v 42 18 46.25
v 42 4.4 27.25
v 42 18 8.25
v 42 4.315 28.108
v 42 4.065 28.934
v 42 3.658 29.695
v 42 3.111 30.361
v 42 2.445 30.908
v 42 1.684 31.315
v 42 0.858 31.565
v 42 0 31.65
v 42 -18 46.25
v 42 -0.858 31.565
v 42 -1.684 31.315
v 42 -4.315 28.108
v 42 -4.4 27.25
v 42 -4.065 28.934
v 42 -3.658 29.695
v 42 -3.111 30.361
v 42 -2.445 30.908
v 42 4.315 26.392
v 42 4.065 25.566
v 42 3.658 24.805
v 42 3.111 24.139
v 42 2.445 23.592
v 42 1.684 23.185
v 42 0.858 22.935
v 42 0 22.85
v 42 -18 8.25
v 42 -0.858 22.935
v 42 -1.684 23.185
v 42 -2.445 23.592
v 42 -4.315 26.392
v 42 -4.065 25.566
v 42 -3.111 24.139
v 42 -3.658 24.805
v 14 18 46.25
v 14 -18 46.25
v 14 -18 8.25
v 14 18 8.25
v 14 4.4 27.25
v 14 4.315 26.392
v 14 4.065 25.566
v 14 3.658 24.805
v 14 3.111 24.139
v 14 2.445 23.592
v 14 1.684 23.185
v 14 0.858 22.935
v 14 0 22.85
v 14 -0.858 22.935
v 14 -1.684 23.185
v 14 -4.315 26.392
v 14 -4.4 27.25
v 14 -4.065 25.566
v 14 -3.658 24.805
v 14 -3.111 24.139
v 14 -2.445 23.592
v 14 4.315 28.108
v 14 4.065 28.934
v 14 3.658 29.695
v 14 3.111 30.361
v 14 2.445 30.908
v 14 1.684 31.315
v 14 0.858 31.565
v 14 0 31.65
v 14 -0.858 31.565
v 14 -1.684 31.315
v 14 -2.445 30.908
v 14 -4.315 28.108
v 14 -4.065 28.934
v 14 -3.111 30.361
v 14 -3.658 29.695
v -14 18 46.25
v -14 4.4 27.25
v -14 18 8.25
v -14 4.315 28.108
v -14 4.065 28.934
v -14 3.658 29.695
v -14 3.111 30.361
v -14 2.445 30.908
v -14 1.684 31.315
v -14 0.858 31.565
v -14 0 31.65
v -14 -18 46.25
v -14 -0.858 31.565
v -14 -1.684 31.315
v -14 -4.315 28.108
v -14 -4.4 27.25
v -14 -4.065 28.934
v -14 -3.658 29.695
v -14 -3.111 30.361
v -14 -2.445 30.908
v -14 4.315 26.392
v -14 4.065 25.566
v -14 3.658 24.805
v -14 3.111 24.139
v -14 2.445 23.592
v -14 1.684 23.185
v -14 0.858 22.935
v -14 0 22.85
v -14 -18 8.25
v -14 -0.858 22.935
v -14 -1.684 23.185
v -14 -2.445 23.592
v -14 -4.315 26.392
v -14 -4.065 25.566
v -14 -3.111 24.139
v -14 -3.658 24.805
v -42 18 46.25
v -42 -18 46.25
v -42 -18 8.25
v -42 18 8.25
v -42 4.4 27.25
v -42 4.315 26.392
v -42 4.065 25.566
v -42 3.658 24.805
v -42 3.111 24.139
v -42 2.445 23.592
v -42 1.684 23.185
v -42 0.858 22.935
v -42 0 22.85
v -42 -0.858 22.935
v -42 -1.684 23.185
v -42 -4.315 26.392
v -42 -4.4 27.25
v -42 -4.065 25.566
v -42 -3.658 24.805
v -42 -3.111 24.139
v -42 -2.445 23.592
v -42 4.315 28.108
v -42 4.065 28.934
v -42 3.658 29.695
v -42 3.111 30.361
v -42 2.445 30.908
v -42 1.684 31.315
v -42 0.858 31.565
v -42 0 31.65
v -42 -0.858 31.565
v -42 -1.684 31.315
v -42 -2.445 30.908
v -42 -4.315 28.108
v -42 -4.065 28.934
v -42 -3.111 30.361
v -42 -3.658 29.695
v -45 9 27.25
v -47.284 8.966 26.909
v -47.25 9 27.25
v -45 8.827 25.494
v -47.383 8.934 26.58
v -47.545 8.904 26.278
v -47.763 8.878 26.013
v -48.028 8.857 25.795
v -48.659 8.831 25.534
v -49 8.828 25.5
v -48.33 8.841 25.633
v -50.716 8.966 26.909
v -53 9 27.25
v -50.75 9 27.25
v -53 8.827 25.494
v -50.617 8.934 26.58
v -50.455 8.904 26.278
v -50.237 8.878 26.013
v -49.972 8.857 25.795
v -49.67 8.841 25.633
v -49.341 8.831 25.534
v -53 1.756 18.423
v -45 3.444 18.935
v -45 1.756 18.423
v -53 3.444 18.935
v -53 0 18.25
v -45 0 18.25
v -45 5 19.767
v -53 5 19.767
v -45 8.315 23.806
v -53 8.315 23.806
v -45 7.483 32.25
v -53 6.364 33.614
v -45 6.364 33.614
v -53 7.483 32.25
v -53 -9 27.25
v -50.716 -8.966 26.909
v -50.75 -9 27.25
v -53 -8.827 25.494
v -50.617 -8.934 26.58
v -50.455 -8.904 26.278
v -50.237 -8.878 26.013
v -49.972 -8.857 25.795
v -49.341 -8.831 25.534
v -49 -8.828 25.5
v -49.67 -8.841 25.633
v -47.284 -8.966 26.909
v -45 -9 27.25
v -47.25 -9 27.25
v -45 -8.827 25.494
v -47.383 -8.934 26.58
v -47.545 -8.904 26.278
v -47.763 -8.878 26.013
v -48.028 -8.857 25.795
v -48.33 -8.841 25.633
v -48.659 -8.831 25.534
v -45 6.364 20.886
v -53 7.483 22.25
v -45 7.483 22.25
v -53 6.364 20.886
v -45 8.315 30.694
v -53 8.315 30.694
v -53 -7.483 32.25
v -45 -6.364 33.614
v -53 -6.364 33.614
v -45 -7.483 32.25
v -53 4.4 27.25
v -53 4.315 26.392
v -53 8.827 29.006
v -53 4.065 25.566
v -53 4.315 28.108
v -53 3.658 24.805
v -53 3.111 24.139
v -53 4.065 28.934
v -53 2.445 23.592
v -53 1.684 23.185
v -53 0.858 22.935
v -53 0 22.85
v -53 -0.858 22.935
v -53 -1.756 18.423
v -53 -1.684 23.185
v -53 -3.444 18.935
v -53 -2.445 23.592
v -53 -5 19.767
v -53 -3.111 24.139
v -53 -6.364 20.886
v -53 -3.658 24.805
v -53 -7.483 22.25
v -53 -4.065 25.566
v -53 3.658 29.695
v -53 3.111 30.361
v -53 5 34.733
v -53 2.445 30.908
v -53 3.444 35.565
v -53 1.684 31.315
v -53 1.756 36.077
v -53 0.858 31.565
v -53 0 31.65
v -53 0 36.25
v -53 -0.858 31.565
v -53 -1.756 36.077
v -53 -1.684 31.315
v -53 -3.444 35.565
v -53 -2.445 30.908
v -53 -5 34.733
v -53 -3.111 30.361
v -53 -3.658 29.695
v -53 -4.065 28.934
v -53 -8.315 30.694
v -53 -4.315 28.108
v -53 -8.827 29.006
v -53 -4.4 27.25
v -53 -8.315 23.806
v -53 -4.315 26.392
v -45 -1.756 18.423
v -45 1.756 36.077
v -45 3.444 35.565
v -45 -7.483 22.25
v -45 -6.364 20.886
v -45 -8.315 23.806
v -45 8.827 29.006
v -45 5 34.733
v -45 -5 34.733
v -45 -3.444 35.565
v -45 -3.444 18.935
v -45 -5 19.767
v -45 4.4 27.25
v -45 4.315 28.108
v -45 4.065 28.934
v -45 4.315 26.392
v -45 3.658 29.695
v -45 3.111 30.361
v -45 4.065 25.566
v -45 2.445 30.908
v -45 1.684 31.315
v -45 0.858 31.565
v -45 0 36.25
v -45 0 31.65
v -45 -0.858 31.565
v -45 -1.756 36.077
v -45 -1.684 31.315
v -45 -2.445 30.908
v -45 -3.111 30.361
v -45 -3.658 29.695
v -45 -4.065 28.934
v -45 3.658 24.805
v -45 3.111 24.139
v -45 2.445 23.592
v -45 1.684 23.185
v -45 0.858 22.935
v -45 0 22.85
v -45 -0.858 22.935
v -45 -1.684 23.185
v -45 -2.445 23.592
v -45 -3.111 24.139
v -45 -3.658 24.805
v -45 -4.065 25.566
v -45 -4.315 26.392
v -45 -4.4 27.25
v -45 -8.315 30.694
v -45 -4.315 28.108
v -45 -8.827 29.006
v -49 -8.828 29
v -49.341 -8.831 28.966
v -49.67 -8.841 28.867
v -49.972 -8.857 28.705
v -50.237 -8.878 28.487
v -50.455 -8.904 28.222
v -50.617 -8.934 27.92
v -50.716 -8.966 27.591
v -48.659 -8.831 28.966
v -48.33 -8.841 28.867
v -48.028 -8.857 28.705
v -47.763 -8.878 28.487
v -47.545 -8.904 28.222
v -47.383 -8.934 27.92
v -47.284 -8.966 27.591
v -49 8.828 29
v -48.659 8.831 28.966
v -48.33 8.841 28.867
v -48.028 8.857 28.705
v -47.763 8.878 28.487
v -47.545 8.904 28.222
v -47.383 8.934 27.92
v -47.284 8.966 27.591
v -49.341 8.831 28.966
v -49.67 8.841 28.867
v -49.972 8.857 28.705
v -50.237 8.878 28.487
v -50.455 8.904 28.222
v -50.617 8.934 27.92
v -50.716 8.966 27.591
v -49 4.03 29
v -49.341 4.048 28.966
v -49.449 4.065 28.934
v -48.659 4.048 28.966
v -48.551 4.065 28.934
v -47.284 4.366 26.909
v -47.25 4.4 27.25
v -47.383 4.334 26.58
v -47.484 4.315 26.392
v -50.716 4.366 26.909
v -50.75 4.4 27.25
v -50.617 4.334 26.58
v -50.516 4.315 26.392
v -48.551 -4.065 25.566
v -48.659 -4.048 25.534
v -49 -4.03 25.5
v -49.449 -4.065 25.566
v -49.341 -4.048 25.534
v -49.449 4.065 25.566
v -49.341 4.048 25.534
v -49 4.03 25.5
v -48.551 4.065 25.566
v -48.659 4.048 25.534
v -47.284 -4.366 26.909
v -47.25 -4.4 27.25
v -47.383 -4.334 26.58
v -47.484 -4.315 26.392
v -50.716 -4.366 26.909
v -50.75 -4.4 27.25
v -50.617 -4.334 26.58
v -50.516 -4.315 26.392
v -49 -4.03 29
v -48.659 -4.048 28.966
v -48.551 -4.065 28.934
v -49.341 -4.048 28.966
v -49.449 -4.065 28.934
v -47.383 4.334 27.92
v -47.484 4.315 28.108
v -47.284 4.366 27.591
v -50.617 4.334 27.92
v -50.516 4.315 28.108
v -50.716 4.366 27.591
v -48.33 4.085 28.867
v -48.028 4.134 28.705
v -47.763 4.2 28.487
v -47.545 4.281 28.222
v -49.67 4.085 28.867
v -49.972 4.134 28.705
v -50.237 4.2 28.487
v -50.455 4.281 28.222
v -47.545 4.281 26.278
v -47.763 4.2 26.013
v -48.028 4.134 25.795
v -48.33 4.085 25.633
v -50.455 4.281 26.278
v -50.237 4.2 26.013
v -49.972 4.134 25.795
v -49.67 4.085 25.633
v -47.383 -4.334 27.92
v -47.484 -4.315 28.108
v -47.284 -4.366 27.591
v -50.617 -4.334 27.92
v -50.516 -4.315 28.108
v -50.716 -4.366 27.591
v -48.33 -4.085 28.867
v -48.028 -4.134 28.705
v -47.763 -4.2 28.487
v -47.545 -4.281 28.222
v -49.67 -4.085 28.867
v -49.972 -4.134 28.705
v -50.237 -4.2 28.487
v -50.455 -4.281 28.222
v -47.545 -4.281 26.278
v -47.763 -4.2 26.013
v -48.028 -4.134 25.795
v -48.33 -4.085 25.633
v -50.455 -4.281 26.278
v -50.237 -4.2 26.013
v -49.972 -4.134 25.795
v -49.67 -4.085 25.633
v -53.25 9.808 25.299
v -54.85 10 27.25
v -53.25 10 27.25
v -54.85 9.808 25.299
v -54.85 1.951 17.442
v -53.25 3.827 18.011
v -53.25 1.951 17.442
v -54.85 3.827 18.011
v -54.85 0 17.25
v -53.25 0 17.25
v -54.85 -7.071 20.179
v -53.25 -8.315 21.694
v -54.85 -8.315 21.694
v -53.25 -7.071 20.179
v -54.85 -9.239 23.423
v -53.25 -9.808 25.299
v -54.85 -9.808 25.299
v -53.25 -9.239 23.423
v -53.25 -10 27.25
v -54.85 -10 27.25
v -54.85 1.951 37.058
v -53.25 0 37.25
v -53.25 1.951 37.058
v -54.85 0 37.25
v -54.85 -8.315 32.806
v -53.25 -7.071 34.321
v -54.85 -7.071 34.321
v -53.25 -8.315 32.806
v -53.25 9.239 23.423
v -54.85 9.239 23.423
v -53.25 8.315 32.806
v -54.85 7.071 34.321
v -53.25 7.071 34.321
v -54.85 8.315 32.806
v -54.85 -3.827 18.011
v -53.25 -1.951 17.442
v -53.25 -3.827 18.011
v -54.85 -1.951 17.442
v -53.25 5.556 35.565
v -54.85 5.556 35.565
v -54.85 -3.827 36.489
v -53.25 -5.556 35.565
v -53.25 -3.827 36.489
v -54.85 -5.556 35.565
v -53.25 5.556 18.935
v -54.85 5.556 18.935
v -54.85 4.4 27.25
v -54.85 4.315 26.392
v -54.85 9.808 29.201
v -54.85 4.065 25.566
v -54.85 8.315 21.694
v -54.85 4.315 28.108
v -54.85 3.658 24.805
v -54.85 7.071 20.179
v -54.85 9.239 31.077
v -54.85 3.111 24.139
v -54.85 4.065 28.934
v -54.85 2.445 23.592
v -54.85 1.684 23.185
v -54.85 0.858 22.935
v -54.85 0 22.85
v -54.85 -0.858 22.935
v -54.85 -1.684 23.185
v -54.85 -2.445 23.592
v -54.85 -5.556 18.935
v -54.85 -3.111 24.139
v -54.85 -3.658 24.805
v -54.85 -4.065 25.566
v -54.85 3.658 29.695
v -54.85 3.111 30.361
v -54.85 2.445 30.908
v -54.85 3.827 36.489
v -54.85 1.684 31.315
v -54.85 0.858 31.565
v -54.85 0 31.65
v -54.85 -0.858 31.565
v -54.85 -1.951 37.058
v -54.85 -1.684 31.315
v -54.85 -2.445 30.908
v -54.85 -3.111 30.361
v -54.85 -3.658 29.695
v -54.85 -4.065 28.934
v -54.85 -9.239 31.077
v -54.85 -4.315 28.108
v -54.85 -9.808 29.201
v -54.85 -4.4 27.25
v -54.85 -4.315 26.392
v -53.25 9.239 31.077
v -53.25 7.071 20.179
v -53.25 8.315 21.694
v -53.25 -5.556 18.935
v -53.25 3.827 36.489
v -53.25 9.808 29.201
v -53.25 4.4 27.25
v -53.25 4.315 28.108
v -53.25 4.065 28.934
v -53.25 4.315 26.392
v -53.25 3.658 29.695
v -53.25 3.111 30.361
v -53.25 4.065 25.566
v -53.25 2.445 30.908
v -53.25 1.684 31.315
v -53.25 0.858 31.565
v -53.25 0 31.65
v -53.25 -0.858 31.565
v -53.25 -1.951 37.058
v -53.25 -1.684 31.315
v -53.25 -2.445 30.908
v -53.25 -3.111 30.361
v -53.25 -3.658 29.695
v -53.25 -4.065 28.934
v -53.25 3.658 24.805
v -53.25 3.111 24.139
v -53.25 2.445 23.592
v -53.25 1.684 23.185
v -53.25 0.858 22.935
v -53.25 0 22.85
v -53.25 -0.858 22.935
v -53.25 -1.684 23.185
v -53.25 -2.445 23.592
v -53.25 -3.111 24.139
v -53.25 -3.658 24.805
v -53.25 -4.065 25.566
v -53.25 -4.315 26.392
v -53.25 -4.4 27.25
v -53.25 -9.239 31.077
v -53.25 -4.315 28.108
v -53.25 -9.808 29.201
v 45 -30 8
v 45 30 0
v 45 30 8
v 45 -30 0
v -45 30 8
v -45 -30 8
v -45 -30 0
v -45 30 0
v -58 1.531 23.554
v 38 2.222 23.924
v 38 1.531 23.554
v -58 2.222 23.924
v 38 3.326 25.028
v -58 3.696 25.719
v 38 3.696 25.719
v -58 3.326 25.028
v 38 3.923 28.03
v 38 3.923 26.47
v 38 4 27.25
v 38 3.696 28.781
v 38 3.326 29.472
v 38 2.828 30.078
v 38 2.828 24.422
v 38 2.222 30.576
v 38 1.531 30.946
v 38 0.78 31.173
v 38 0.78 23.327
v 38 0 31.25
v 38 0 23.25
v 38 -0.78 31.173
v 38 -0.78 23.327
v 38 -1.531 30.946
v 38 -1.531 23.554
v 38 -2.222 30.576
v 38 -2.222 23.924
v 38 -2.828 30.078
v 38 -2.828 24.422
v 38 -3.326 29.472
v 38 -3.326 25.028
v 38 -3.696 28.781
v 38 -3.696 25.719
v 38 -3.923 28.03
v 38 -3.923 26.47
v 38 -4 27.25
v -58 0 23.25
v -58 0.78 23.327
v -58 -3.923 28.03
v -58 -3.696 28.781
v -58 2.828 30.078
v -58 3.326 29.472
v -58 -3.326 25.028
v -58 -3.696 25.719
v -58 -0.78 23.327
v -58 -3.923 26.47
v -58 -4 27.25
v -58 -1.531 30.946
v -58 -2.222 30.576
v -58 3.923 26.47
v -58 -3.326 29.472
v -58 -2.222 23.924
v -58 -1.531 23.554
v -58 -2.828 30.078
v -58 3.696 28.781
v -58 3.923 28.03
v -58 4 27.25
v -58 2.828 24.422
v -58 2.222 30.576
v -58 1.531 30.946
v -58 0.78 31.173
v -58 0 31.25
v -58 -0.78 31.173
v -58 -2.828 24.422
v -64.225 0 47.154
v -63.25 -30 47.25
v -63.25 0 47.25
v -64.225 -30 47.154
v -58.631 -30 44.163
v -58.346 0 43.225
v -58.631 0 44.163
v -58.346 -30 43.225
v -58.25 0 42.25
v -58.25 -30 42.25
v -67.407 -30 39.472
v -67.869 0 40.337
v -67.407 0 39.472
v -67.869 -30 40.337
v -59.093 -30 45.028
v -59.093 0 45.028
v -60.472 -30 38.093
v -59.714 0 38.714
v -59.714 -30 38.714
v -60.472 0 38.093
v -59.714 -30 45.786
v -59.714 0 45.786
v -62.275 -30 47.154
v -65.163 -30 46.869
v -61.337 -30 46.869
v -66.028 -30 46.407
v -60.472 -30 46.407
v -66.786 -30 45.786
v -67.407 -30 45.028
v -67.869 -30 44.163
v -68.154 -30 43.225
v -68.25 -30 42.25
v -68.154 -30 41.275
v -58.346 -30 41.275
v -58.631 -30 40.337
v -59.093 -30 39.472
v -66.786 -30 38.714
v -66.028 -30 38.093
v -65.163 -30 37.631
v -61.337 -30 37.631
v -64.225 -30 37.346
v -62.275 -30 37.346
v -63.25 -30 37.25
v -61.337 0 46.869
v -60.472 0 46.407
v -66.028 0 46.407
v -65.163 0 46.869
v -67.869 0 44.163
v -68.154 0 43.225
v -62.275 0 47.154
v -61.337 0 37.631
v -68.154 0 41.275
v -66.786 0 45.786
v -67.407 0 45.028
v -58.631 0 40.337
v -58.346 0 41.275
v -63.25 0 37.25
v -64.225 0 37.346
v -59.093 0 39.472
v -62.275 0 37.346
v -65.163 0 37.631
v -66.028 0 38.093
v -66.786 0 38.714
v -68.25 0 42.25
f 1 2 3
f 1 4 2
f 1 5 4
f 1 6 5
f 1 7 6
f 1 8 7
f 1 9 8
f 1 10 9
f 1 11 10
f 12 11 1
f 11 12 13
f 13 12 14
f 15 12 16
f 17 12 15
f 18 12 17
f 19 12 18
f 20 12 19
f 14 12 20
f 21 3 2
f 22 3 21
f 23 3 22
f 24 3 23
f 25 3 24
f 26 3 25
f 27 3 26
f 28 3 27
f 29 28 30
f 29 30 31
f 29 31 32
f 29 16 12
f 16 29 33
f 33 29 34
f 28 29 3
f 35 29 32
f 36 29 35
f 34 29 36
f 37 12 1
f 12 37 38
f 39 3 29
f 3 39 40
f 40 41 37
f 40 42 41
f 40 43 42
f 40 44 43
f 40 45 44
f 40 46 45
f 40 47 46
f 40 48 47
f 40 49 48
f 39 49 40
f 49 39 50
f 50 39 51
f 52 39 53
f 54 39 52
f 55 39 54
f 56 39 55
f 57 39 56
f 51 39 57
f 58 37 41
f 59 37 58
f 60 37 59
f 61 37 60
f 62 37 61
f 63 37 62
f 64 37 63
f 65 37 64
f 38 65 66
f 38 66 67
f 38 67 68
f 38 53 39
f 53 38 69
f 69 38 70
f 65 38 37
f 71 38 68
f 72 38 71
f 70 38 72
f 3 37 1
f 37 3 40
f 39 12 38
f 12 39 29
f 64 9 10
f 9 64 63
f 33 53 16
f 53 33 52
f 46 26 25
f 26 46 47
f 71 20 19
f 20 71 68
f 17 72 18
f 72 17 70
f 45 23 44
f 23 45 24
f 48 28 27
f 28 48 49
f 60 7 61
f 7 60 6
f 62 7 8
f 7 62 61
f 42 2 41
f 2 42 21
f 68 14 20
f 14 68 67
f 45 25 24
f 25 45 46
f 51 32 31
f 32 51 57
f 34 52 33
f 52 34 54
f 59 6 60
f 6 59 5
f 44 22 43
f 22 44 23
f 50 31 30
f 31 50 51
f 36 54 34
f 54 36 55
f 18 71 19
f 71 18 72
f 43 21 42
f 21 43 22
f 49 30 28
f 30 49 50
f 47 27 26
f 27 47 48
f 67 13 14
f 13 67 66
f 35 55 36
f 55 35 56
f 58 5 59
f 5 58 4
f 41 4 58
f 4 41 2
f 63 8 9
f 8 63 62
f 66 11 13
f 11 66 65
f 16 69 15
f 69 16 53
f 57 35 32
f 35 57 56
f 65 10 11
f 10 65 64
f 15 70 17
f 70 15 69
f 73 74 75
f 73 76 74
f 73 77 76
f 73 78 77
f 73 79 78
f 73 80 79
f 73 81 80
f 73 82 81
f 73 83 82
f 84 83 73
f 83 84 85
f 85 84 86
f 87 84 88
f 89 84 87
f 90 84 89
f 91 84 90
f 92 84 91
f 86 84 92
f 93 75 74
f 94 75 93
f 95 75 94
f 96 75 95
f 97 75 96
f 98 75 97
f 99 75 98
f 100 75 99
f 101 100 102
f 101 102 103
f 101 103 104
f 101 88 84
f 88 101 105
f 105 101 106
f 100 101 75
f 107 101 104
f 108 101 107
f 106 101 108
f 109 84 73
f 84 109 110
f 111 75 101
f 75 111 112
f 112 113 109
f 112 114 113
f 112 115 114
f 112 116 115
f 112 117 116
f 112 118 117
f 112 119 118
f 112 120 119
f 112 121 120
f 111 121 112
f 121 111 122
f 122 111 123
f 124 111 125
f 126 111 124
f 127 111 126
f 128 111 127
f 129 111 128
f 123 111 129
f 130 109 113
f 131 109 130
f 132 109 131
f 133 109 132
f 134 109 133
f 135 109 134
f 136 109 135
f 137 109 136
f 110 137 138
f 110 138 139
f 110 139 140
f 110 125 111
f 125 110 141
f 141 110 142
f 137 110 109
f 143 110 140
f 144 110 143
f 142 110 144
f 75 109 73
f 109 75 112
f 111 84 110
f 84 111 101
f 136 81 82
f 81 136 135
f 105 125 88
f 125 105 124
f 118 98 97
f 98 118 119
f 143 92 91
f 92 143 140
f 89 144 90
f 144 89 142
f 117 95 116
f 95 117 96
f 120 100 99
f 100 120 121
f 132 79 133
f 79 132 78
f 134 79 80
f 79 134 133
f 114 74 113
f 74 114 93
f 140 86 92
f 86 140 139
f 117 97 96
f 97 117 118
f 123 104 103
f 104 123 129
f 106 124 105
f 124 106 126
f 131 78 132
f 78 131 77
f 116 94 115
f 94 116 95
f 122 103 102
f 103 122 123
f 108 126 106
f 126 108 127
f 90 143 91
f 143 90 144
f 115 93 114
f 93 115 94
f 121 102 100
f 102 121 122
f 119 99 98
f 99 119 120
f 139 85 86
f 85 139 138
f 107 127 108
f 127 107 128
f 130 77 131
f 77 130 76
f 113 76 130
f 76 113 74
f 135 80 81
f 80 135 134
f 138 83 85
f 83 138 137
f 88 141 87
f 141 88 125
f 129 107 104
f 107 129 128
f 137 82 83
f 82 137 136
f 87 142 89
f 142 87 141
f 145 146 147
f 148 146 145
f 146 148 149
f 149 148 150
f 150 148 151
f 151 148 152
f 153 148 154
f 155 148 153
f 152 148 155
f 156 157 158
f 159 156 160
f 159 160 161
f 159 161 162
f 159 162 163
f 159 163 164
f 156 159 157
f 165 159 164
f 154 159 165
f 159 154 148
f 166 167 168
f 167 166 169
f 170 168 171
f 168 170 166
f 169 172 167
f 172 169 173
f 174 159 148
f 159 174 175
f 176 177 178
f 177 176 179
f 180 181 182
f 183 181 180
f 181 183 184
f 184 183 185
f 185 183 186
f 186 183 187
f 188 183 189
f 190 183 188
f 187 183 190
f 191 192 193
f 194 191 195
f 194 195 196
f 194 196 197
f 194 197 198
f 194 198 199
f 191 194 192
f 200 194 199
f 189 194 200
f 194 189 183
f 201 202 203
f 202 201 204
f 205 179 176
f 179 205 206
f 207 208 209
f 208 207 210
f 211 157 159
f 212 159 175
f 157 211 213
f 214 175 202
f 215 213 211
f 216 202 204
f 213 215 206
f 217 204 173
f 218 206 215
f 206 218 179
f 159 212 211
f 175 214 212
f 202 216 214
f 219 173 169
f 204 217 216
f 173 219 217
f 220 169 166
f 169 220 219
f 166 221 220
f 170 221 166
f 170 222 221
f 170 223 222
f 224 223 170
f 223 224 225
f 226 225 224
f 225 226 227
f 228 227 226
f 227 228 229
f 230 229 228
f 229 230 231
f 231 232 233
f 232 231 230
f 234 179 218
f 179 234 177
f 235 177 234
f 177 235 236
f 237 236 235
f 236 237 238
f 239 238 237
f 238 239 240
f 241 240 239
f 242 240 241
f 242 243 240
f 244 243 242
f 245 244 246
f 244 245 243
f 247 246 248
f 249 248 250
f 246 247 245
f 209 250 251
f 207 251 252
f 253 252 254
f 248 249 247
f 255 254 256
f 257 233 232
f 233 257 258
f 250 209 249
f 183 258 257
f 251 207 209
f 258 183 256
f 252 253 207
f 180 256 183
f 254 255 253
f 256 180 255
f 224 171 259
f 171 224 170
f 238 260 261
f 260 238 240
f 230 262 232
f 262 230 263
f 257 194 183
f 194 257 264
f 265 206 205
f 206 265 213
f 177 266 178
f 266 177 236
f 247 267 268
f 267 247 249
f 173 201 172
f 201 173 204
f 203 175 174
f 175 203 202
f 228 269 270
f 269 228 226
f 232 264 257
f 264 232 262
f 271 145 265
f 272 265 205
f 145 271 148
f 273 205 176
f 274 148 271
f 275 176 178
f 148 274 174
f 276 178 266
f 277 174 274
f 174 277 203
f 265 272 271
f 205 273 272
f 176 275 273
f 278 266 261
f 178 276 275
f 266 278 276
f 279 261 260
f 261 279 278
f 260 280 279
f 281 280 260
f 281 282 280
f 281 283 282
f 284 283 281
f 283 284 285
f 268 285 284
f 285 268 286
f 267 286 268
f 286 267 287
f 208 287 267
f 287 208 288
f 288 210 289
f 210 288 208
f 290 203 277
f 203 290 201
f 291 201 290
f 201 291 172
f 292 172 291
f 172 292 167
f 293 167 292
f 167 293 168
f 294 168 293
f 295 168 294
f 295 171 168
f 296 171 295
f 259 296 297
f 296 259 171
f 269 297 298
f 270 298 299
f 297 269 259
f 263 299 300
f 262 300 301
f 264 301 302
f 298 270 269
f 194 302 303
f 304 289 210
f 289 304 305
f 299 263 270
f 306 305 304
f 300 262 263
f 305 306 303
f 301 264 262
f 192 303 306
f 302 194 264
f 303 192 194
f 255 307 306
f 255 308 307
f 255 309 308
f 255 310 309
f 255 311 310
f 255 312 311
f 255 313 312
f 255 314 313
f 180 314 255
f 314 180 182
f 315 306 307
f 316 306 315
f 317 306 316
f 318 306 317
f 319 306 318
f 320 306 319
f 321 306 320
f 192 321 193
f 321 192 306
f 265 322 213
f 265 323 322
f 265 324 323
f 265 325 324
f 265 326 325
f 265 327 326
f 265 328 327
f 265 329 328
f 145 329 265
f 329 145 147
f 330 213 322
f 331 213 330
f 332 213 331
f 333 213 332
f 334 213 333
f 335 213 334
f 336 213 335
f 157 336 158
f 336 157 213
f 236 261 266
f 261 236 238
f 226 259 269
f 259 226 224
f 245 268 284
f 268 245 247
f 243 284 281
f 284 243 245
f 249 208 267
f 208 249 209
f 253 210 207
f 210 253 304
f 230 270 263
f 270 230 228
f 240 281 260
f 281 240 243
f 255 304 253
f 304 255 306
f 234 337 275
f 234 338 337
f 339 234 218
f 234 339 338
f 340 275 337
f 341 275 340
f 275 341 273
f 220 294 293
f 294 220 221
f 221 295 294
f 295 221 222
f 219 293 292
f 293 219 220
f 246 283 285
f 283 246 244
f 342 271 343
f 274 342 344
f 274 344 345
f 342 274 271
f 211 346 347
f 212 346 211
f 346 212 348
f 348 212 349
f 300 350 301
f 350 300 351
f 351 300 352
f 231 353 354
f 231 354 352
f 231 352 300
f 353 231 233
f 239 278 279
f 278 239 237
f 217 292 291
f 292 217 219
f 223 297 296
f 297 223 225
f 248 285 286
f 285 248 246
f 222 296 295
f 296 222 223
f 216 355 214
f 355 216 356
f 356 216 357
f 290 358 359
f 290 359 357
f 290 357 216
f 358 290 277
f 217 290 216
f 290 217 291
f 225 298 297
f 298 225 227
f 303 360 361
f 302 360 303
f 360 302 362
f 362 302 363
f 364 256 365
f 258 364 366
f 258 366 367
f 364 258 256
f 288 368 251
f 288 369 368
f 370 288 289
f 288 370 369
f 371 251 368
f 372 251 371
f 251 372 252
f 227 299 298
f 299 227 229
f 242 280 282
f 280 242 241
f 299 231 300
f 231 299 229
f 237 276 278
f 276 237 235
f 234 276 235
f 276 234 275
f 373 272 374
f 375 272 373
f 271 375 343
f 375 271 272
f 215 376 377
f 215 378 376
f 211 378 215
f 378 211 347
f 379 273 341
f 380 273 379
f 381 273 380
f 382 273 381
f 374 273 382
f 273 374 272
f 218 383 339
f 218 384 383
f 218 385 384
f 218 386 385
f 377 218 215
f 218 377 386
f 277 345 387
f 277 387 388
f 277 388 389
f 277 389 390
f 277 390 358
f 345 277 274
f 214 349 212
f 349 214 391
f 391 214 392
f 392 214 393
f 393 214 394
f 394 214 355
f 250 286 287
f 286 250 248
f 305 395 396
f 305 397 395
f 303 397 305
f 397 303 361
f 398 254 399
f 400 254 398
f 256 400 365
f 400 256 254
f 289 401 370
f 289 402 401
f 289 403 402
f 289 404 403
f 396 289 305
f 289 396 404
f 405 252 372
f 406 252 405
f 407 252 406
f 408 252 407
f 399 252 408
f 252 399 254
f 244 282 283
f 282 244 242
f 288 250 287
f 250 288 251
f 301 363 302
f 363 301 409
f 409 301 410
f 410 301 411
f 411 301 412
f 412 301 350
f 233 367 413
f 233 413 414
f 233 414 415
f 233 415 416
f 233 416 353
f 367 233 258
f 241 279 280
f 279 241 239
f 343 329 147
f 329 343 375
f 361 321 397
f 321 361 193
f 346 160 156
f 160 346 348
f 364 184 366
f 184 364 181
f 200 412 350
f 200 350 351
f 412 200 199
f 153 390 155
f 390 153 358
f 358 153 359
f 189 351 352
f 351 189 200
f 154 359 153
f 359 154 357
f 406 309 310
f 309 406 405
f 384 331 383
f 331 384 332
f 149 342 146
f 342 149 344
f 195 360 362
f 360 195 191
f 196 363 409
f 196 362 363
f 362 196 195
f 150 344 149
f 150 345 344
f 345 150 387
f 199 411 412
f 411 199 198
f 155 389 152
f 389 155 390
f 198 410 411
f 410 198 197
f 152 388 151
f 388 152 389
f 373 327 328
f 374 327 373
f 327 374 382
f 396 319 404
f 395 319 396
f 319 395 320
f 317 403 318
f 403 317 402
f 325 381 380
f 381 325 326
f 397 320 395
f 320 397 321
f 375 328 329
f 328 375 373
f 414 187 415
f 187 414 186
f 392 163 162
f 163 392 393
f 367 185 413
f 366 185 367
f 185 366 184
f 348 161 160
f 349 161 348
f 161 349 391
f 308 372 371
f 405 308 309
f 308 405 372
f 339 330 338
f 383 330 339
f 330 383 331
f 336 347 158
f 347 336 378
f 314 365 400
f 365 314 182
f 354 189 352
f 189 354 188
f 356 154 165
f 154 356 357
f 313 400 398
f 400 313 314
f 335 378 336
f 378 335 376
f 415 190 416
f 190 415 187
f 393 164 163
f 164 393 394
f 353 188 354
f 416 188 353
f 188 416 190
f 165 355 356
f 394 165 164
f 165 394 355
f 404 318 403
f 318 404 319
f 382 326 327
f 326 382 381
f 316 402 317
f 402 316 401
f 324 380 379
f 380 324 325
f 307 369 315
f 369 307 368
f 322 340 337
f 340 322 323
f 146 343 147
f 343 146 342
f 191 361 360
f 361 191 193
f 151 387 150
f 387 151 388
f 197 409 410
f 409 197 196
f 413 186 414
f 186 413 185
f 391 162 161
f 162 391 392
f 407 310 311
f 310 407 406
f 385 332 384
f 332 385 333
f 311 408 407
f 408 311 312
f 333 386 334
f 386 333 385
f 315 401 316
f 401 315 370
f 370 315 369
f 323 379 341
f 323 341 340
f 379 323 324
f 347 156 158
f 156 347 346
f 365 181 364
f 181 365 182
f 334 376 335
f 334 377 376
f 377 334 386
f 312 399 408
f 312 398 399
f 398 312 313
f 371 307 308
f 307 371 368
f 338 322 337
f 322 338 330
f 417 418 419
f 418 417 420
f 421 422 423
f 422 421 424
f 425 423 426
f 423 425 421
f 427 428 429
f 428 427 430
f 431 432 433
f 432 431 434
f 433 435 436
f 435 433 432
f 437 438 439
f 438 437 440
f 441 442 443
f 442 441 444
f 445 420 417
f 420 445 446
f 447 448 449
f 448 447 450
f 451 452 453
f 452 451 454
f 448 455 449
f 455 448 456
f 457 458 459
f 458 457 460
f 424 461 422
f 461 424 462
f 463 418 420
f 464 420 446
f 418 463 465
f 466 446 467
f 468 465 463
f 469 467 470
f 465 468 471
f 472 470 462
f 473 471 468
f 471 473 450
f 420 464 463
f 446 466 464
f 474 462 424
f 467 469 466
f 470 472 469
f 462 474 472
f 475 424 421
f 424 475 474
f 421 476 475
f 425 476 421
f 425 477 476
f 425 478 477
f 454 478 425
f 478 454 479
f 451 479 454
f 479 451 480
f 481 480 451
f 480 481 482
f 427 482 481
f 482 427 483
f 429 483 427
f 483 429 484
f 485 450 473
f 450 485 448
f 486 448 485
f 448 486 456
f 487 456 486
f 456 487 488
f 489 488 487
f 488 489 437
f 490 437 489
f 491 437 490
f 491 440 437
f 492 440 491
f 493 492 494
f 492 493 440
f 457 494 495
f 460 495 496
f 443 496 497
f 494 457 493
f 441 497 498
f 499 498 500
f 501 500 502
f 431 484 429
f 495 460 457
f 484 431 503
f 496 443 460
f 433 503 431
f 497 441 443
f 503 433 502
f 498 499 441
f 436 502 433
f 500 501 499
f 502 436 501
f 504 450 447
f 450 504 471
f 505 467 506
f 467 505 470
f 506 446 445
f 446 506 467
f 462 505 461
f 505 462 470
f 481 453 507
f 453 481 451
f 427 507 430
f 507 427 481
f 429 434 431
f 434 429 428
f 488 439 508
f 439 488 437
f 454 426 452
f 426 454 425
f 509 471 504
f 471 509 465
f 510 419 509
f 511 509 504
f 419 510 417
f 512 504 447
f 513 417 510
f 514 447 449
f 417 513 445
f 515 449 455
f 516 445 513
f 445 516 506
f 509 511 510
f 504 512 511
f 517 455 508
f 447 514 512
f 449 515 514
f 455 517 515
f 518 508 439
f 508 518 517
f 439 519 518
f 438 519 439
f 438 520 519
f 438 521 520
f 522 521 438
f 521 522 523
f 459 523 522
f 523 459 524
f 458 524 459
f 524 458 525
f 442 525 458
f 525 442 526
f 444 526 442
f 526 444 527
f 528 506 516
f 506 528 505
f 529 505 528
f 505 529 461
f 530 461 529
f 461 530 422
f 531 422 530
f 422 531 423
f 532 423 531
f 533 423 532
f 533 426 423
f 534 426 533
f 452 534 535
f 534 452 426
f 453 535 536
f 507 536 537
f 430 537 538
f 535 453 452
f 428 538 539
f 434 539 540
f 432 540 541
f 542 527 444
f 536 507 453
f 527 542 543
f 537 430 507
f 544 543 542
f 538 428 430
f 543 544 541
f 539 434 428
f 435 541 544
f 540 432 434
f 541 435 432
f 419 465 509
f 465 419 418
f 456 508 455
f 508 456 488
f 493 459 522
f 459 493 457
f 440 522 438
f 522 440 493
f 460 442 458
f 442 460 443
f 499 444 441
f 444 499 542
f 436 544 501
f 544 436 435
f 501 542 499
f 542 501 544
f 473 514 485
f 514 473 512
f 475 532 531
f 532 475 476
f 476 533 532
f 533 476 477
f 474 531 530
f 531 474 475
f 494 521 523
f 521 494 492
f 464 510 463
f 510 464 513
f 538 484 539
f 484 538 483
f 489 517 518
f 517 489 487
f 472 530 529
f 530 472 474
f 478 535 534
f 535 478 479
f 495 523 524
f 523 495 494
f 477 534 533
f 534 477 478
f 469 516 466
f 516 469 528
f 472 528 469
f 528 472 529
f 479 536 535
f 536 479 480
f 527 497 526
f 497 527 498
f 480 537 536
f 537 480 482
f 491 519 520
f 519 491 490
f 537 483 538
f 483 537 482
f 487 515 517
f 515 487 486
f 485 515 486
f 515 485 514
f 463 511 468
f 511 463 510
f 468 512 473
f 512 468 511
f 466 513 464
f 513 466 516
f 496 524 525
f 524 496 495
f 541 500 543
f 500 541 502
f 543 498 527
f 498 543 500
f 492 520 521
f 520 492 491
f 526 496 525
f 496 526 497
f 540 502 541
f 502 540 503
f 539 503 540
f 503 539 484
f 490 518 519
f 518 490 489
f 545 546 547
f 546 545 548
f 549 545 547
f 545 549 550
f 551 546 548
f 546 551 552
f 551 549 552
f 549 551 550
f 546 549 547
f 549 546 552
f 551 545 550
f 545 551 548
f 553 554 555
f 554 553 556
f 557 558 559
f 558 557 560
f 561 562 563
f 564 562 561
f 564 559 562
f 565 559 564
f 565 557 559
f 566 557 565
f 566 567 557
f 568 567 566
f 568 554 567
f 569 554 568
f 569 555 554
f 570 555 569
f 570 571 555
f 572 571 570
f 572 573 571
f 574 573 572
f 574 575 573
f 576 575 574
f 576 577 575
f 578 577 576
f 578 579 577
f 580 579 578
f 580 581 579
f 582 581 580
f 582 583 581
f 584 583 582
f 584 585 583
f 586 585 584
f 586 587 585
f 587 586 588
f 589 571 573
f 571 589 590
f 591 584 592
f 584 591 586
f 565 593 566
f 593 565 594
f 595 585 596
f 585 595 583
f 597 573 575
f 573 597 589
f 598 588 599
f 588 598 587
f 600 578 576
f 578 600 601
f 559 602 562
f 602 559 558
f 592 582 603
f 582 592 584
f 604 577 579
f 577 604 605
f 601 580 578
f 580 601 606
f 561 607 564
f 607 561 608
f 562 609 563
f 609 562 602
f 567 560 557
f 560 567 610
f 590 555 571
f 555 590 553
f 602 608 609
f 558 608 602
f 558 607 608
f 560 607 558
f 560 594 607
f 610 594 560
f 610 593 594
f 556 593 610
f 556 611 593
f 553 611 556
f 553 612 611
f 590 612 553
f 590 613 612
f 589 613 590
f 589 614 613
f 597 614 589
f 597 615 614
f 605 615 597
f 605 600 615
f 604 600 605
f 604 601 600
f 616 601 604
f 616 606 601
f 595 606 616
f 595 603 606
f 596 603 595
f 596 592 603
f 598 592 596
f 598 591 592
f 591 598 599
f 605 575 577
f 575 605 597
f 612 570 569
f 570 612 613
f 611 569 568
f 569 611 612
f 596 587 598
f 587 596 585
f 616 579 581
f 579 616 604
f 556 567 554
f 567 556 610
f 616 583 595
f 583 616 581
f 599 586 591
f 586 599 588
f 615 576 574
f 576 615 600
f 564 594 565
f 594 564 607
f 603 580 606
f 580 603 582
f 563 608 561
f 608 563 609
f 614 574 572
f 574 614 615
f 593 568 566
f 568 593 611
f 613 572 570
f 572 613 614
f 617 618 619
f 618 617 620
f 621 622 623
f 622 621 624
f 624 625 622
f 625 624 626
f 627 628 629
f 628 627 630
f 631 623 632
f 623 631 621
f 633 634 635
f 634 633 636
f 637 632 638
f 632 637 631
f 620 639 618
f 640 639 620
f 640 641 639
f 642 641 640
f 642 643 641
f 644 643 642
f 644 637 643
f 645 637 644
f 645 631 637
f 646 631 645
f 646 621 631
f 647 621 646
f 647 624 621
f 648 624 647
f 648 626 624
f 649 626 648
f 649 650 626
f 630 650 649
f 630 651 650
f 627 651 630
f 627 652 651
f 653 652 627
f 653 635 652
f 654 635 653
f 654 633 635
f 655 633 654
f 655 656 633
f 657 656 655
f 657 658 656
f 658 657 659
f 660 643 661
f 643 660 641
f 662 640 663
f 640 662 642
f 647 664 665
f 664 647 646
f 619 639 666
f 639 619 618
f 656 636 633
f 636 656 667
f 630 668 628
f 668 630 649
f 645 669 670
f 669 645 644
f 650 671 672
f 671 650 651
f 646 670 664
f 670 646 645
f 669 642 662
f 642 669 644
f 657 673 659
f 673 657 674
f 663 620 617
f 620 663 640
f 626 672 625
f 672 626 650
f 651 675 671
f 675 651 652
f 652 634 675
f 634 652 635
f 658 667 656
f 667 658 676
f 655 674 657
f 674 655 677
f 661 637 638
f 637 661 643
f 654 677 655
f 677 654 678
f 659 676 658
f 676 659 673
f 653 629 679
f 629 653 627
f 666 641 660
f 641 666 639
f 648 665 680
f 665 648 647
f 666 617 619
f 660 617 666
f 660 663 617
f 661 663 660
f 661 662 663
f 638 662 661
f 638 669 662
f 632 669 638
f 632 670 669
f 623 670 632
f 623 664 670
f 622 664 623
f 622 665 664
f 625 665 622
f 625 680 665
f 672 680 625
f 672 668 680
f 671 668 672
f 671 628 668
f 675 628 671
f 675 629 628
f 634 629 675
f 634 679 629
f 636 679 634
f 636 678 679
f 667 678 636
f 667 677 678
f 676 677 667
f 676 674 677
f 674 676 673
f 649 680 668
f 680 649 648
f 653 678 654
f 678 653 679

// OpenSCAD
$fn = 32;

// ------------------------------------------------------------------------
// Machine vise: screw d8, jaws 28 x 38 mm
// Every part is its own module, assembly() places every instance.
// ------------------------------------------------------------------------

// --- part 1 ---
module vise_bed() {
  difference() {
    translate([-45, -30, 0]) cube([90, 60, 8]);
  }
}

// --- part 2 ---
module vise_jaw() {
  difference() {
    translate([-14, -18, 0]) cube([28, 36, 38]);
    translate([0, 0, 19]) rotate([0, 90, 0]) cylinder(h = 30, d = 8.8, center = true);
  }
}

// --- part 3 ---
module vise_screw() {
  translate([0, 0, -48]) cylinder(h = 96, d = 8);
}

// --- part 4 ---
module screw_collar() {
  difference() {
    cylinder(h = 8, d = 18);
    translate([0, 0, -1]) cylinder(h = 10, d = 8.8);
    translate([0, 0, 4]) rotate([90, 0, 0]) cylinder(h = 20, d = 3.5, center = true);
  }
}

// --- part 5 ---
module screw_washer() {
  difference() {
      translate([0, 0, 0]) cylinder(h = 1.6, d = 20);
      translate([0, 0, -1]) cylinder(h = 3.6, d = 8.8);
    }
}

// --- part 6 ---
module vise_handle() {
  cylinder(h = 30, d = 10);
}

// --- assembly ---
module assembly() {
  color([0.80, 0.24, 0.20]) translate([0, 0, 0]) rotate([0, 0, 0]) vise_bed();
  color([0.20, 0.45, 0.75]) translate([28, 0, 8.25]) rotate([0, 0, 0]) vise_jaw();
  color([0.25, 0.62, 0.32]) translate([-28, 0, 8.25]) rotate([0, 0, 0]) vise_jaw();
  color([0.92, 0.70, 0.18]) translate([-10, 0, 27.25]) rotate([0, 90, 0]) vise_screw();
  color([0.58, 0.35, 0.70]) translate([-53, 0, 27.25]) rotate([0, 90, 0]) screw_collar();
  color([0.16, 0.66, 0.66]) translate([-54.85, 0, 27.25]) rotate([0, 90, 0]) screw_washer();
  color([0.85, 0.48, 0.18]) translate([-63.25, 0, 42.25]) rotate([90, 0, 0]) vise_handle();
}

assembly();
